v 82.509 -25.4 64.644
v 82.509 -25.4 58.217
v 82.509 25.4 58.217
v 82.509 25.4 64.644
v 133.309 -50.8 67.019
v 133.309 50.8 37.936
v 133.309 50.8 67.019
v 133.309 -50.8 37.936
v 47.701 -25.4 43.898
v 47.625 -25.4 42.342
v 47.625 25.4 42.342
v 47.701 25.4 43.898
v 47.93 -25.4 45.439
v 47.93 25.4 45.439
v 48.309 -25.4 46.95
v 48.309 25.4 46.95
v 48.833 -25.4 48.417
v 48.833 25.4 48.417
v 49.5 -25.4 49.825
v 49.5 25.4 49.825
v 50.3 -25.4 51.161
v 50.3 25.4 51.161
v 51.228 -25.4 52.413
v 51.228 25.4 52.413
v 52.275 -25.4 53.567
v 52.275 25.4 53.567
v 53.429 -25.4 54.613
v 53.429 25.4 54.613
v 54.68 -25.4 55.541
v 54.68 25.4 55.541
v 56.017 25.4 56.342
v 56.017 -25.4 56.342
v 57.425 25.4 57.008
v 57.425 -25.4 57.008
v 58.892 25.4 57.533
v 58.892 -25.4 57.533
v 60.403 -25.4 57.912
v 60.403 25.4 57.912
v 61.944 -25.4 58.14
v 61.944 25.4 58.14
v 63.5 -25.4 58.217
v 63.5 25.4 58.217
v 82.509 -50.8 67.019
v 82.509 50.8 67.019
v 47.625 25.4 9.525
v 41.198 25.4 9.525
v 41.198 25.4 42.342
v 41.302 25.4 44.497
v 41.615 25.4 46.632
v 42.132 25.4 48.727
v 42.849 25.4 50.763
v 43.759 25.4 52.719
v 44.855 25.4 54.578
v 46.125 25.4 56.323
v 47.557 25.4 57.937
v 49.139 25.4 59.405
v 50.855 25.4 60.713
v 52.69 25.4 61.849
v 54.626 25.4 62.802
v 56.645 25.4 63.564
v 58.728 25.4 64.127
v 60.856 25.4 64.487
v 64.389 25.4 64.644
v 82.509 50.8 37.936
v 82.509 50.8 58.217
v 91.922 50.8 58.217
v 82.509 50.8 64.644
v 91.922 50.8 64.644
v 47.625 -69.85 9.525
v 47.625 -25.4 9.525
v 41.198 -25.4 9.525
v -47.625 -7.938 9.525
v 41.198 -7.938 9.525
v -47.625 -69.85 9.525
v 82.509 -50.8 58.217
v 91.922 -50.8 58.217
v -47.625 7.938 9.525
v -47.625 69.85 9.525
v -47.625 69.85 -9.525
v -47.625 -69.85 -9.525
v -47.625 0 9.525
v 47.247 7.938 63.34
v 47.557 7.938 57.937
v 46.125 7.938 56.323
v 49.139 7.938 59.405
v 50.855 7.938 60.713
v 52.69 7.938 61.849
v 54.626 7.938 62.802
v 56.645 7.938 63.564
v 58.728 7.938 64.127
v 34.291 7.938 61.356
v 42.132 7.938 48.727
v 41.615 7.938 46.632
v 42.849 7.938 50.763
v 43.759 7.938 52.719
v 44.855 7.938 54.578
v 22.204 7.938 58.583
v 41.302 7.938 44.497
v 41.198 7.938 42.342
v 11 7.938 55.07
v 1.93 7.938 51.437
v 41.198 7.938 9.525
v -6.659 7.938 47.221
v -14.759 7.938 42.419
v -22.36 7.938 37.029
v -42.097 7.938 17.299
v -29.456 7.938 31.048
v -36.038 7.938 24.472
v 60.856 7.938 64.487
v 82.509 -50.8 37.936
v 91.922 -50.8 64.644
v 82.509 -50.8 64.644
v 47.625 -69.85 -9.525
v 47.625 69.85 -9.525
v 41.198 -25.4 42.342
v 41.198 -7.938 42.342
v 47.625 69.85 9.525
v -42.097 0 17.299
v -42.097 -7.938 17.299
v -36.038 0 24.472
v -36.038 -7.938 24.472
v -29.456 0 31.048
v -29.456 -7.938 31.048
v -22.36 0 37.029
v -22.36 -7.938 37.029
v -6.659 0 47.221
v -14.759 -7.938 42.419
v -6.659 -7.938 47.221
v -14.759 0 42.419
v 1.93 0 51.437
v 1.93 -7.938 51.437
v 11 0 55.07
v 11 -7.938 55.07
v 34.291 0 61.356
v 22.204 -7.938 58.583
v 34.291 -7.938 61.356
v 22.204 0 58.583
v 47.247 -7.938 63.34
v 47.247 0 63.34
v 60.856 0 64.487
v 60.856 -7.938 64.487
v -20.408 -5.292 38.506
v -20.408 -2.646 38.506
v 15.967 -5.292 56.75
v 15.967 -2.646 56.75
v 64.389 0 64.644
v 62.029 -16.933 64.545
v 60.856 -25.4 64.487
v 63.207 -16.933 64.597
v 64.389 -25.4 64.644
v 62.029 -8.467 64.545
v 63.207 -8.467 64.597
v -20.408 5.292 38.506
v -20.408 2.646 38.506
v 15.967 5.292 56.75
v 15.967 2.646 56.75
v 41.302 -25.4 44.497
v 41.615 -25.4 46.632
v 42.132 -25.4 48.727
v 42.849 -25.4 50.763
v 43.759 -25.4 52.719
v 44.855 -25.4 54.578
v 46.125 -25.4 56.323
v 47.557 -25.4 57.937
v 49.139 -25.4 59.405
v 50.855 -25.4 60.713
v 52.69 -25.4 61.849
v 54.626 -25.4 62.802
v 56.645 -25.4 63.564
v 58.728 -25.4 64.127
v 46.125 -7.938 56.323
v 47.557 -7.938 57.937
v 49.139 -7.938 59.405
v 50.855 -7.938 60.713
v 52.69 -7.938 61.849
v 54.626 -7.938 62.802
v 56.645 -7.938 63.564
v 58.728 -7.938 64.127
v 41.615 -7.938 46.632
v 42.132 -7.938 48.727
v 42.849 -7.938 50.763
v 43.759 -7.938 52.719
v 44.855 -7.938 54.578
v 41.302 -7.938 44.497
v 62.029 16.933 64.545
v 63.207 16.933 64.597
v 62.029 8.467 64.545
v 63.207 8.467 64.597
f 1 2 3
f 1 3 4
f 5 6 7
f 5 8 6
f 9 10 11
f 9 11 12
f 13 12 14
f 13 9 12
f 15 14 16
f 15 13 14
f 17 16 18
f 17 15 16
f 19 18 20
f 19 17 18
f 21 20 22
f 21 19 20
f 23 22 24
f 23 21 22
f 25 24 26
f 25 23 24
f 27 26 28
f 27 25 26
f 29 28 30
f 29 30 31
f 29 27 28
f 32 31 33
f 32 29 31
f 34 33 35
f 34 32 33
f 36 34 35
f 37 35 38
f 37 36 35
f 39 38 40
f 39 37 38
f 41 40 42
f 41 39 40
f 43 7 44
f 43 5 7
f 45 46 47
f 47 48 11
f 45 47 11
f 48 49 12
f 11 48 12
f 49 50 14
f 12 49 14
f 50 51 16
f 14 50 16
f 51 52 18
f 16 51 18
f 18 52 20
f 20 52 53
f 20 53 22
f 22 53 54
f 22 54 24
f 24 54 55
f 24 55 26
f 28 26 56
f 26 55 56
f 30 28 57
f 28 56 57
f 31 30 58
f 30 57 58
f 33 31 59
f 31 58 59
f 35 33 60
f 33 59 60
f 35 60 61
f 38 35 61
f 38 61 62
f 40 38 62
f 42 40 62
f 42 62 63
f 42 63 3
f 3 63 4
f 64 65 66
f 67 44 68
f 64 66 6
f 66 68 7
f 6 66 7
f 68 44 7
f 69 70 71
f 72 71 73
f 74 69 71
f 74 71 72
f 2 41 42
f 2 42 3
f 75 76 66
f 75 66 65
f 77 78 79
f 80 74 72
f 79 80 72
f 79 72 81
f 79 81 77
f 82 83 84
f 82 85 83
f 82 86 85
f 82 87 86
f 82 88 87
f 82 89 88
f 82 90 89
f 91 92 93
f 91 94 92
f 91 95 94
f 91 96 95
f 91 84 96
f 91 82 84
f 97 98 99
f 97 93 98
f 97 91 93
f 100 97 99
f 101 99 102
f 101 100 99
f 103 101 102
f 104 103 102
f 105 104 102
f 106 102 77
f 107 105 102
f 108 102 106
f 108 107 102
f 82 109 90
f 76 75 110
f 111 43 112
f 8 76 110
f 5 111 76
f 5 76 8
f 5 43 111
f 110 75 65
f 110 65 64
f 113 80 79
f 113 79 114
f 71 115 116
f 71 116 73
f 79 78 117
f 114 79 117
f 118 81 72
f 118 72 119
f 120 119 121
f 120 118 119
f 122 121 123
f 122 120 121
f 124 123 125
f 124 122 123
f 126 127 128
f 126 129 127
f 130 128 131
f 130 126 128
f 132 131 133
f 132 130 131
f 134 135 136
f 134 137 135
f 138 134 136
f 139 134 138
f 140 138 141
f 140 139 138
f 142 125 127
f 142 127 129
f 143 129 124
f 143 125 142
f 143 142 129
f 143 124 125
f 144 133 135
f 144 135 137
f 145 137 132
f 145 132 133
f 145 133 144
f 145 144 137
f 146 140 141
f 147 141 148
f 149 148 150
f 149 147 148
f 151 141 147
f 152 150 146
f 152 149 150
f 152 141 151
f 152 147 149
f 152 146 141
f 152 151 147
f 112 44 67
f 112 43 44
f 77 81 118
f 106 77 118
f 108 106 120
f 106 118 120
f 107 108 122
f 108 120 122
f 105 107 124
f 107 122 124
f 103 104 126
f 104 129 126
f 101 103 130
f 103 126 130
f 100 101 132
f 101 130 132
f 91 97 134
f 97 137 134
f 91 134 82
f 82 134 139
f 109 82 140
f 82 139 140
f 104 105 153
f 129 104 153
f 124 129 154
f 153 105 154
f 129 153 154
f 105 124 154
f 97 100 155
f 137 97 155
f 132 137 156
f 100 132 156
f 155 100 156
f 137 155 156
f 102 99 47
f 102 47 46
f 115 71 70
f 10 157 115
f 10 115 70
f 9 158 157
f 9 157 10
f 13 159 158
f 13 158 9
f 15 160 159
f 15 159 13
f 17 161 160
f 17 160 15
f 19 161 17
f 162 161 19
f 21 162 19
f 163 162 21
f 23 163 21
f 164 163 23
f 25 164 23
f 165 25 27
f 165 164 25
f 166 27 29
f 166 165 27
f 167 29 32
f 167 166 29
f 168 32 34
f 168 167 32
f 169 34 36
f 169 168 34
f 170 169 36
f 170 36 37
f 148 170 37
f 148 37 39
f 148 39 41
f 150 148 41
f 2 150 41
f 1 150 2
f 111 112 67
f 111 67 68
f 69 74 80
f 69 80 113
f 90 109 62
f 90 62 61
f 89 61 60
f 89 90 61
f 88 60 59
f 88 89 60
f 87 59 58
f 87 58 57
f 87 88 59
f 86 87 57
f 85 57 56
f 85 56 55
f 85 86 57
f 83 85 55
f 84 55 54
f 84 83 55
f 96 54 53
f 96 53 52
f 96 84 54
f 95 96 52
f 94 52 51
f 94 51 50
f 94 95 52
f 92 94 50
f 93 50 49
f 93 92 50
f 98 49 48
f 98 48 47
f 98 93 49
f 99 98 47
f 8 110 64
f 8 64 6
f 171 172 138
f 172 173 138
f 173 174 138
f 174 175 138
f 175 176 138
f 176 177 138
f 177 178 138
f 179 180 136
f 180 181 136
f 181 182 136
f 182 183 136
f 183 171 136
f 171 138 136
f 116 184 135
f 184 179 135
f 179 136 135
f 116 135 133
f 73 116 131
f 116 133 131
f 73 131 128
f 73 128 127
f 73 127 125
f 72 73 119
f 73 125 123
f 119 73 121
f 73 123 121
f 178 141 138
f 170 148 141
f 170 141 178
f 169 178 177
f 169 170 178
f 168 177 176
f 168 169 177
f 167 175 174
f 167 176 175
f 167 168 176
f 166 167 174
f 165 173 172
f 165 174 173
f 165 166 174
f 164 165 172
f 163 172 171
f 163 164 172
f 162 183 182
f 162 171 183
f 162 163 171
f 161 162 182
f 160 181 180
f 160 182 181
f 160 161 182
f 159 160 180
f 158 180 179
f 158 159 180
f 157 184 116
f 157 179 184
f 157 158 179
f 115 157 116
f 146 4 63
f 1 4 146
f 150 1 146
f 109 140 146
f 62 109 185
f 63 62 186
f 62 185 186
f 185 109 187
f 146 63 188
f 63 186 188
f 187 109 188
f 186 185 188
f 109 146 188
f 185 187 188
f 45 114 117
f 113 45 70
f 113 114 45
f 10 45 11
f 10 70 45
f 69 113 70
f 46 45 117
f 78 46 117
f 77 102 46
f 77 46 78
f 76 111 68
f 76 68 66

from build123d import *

# Parameters (mm, degrees)
F1_DEPTH = 69.85
F2_DEPTH = 7.9375
F3_DEPTH = 25.4
F4_DEPTH = 50.8


with BuildPart() as f1:
    # F0 (on Front) → F1 (new body, symmetric)
    with BuildSketch(Plane.XZ):
        Polygon((-47.625, 9.525), (-47.625, -9.525), (47.625, -9.525), (47.625, 9.525), (41.197957, 9.525), align=None)
    extrude(amount=F1_DEPTH, both=True)

    # F0 (on Front) → F2 (join, symmetric)
    with BuildSketch(Plane.XZ):
        with BuildLine():
            add(Edge.make_bspline(
                [(-47.625, 9.525), (-25.200024, 43.95073), (11.923234, 61.926834), (60.856011, 64.4865)],
                knots=[0, 0, 0, 0, 123.682628, 123.682628, 123.682628, 123.682628], degree=3))
            Line((-47.625, 9.525), (41.197957, 9.525))
            Line((41.197957, 9.525), (41.197957, 42.34174))
            ThreePointArc((41.197957, 42.34174), (46.821459, 57.147393), (60.856011, 64.4865))
        make_face()
    extrude(amount=F2_DEPTH, both=True)

    # F0 (on Front) → F3 (join, symmetric)
    with BuildSketch(Plane.XZ):
        with BuildLine():
            Line((41.197957, 9.525), (47.625, 9.525))
            Line((47.625, 9.525), (47.625, 42.34174))
            ThreePointArc((47.625, 42.34174), (52.27468, 53.56706), (63.5, 58.21674))
            Line((63.5, 58.21674), (82.50929, 58.21674))
            Line((82.50929, 58.21674), (82.50929, 64.643782))
            Line((82.50929, 64.643782), (64.388974, 64.643782))
            add(Edge.make_bspline(
                [(60.856011, 64.4865), (62.026916, 64.54775), (63.204584, 64.600173), (64.388974, 64.643782)],
                knots=[123.682628, 123.682628, 123.682628, 123.682628, 126.642212, 126.642212, 126.642212, 126.642212], degree=3))
            ThreePointArc((60.856011, 64.4865), (46.821459, 57.147393), (41.197957, 42.34174))
            Line((41.197957, 42.34174), (41.197957, 9.525))
        make_face()
    extrude(amount=F3_DEPTH, both=True)


with BuildPart() as f4:
    # F0 (on Front) → F4 (new body, symmetric)
    with BuildSketch(Plane.XZ):
        Polygon((82.50929, 67.018588), (82.50929, 64.643782), (91.921728, 64.643782), (91.921728, 58.21674), (82.50929, 58.21674), (82.50929, 37.935588), (133.30929, 37.935588), (133.30929, 67.018588), align=None)
    extrude(amount=F4_DEPTH, both=True)


solid = Compound([f1.part, f4.part])
